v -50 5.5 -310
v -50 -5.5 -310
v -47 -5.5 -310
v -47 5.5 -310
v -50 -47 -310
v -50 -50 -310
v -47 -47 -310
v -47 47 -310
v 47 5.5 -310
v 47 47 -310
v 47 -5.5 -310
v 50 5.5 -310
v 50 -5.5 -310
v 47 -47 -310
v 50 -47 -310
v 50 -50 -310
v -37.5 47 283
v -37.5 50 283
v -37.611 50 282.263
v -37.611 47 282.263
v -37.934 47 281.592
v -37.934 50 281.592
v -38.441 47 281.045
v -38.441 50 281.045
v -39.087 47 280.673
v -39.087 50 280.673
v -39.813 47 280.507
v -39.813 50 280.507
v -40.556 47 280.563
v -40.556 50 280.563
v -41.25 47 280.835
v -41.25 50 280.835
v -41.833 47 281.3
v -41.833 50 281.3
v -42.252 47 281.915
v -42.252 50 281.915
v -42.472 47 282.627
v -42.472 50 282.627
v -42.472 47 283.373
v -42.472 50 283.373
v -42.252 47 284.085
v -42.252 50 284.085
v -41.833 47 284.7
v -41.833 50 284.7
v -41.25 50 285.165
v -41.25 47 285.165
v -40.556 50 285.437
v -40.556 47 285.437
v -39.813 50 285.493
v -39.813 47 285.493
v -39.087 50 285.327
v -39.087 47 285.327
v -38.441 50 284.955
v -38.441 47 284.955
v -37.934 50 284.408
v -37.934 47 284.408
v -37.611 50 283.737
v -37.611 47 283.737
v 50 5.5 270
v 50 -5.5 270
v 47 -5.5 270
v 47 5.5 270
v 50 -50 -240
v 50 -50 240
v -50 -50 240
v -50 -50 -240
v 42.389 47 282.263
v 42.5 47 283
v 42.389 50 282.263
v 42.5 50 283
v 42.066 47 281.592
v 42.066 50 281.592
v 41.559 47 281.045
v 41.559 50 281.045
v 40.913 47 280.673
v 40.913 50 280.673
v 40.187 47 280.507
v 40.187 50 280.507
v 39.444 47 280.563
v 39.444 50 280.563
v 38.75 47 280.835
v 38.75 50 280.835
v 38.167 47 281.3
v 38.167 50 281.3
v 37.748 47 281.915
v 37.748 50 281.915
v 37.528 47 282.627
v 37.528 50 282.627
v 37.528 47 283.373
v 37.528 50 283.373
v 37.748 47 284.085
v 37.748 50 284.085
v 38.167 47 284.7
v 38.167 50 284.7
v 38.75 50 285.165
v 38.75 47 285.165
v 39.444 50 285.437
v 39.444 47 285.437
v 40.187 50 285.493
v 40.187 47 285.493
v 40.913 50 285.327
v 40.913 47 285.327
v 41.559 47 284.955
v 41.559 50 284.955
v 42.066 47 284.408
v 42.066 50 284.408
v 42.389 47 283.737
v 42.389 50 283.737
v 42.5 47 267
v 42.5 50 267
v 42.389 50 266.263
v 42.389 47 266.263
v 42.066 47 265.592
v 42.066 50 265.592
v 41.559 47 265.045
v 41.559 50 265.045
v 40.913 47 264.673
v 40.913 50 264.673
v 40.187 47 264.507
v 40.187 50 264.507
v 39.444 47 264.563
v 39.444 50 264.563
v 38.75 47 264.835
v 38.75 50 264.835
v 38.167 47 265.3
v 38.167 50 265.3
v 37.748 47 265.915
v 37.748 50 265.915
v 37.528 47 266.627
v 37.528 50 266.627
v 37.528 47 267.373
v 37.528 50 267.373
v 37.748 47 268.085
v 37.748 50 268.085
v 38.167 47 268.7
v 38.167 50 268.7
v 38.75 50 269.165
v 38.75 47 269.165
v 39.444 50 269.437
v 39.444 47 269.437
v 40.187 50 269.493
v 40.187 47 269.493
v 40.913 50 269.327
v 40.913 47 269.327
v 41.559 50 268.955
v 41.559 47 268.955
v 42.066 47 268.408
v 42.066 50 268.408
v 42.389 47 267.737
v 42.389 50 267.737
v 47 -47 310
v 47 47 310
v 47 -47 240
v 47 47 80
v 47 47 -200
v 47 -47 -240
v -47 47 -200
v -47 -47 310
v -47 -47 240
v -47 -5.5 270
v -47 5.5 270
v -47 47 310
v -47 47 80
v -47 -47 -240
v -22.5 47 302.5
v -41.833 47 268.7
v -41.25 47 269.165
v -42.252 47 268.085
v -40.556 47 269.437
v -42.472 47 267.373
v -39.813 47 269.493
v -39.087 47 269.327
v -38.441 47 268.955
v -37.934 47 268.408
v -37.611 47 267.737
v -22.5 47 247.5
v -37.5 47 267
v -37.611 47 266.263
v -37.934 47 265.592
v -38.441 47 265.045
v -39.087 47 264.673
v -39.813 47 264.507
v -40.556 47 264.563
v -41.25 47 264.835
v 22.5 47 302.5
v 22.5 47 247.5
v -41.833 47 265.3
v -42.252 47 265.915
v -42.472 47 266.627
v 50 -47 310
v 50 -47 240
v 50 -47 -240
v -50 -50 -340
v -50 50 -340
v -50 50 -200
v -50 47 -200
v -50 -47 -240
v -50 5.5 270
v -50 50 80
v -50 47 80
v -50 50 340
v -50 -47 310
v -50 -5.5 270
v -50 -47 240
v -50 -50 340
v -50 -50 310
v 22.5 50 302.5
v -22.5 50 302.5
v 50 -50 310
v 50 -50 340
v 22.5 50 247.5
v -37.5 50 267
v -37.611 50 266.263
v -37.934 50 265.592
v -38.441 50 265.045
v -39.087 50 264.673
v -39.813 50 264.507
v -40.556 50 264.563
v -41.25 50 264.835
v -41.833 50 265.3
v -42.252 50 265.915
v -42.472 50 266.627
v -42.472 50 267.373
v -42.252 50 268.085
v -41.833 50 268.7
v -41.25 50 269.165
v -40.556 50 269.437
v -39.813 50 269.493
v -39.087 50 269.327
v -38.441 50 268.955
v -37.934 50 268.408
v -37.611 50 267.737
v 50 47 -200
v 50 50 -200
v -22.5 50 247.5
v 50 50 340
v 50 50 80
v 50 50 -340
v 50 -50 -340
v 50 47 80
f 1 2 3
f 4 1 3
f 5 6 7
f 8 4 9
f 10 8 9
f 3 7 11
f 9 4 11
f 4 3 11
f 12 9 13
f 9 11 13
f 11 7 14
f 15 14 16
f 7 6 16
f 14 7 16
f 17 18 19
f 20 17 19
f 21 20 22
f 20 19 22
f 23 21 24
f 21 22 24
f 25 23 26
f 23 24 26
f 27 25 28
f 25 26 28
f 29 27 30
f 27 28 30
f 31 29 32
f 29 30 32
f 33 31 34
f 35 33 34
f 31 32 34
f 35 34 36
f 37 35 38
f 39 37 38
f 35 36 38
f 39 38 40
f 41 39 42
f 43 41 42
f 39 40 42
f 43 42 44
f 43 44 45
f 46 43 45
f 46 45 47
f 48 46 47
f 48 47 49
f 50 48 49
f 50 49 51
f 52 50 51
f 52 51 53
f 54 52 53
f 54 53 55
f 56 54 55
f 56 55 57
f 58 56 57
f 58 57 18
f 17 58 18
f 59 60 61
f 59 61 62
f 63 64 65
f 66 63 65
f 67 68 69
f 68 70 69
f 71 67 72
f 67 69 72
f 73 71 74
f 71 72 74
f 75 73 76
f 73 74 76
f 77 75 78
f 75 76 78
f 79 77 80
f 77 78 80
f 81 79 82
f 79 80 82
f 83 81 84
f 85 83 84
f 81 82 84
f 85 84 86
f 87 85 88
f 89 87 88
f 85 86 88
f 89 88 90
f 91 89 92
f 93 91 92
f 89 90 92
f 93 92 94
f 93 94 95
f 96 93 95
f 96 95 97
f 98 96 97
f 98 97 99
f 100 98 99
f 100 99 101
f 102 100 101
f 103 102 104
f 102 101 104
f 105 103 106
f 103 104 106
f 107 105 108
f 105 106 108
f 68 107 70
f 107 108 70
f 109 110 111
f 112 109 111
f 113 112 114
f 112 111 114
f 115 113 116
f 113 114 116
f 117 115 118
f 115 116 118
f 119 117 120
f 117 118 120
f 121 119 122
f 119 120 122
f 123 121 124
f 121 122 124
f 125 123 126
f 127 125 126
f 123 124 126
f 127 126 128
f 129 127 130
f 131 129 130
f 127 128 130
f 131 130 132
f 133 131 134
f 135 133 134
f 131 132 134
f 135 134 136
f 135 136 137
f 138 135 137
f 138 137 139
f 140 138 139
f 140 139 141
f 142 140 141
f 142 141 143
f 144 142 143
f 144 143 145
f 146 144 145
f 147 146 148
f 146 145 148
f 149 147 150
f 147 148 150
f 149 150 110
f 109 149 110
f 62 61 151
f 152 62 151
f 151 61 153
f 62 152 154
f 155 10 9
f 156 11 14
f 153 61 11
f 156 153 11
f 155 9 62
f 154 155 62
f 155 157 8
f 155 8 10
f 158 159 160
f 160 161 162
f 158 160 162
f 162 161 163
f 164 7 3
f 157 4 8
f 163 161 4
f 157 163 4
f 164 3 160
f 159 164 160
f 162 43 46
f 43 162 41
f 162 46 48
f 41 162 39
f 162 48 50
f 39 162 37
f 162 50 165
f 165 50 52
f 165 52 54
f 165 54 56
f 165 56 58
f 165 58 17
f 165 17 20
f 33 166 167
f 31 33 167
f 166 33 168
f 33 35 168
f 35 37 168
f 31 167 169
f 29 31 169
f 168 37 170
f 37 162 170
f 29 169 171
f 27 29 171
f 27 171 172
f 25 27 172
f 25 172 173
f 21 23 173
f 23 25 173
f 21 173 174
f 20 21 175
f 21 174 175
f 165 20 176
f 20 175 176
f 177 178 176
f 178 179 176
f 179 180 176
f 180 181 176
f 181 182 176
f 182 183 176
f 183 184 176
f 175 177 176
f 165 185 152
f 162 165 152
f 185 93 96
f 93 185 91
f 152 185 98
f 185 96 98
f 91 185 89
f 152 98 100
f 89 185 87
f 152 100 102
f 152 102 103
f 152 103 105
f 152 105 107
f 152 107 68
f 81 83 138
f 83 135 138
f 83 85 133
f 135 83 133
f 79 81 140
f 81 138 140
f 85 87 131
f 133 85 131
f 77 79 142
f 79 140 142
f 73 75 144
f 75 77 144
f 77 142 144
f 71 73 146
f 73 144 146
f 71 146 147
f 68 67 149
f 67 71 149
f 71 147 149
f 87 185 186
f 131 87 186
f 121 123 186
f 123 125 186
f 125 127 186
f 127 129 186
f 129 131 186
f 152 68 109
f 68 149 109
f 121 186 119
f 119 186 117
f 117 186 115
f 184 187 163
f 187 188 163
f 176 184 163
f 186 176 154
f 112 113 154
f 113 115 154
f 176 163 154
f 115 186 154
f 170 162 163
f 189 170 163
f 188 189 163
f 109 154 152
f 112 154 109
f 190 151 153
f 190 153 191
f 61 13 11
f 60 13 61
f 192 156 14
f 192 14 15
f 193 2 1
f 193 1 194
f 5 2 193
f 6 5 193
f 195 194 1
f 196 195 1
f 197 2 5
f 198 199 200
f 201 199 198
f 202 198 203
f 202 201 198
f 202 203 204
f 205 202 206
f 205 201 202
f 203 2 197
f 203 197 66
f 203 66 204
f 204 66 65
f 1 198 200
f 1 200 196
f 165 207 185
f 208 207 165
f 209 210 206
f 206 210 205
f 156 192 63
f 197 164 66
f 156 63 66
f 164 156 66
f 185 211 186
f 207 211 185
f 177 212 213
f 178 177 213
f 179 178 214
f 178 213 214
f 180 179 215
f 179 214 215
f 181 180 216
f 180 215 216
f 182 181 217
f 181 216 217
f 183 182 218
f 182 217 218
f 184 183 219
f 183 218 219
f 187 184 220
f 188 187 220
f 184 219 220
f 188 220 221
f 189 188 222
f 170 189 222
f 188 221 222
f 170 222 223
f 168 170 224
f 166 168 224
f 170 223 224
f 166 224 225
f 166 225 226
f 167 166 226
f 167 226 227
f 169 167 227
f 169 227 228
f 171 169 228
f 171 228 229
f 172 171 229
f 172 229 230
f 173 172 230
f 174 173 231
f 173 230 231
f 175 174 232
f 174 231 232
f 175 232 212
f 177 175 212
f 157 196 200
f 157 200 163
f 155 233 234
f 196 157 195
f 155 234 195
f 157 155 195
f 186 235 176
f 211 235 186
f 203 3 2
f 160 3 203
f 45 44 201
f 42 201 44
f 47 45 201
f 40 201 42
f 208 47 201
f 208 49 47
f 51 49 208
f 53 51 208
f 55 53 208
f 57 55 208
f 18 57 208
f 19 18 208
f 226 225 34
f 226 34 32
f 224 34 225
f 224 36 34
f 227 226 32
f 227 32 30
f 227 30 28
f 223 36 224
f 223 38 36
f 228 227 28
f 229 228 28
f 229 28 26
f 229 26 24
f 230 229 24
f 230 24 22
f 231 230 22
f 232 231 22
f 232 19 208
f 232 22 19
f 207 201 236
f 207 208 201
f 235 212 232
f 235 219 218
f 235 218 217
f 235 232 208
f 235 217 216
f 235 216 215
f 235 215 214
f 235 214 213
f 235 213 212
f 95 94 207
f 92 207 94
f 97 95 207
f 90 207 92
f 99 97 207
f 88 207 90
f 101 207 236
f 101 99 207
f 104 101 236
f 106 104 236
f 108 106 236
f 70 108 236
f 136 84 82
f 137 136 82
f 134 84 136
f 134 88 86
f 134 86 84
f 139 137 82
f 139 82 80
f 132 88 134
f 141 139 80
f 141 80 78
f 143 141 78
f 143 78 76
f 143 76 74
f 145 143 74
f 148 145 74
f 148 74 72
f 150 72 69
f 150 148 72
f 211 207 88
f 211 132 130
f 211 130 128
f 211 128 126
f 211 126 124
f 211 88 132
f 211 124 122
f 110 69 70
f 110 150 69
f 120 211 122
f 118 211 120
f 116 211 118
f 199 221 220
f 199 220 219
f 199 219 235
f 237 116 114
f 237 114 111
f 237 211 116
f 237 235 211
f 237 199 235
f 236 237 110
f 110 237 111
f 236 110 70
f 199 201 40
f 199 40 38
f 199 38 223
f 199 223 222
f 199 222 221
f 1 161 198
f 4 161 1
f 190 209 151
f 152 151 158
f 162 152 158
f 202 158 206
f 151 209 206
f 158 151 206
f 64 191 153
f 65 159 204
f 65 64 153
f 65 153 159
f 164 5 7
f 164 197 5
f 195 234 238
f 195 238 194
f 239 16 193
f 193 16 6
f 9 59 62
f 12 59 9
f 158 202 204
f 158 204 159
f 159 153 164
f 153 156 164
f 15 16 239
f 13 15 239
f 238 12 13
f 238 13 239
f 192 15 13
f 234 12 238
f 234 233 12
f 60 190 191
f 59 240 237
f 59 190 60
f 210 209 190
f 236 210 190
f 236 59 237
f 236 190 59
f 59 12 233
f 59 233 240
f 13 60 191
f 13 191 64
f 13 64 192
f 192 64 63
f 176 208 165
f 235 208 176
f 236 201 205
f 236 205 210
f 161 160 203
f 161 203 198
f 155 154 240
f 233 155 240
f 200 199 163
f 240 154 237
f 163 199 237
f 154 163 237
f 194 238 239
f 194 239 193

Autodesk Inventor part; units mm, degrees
ref_plane "YZ Plane" through (0, 0, 0) normal (1, 0, 0) x (0, 1, 0)
ref_plane "XZ Plane" through (0, 0, 0) normal (0, 1, 0) x (-1, 0, 0)
ref_plane "XY Plane" through (0, 0, 0) normal (0, 0, 1) x (1, 0, 0)
sketch "Sketch1" plane through (0, 0, 0) normal (0, 0, 1) x (1, 0, 0)
  line L0 (-50, 50) -> (50, 50)
  line L1 (50, 50) -> (50, -50)
  line L2 (50, -50) -> (-50, -50)
  line L3 (-50, -50) -> (-50, 50)
  line L4 (-50, 50) -> (50, -50) construction
  line L5 (50, 50) -> (-50, -50) construction
  line L6 (-47, 47) -> (47, 47)
  line L7 (47, 47) -> (47, -47)
  line L8 (47, -47) -> (-47, -47)
  line L9 (-47, -47) -> (-47, 47)
  line L10 (-47, 47) -> (47, -47) construction
  line L11 (47, 47) -> (-47, -47) construction
  point P0 (0, 0)
  dimension "d0" = 100
  dimension "d1" = 100
  dimension "d2" = 94
  dimension "d3" = 94
extrude "Extrusion1" add sketch "Sketch1" along normal mid plane 620
sketch "Sketch3" plane through (50, -50, 310) normal (1, 0, 0) x (0, 0, -1)
  line L0 (310, 50) -> (40, 50)
  line L1 (310, 50) -> (620, 50)
  line L2 (620, 50) -> (330, 50)
  line L3 (40, 50) -> (330, 50)
  line L4 (40, 55.5) -> (620, 55.5)
  line L5 (620, 55.5) -> (620, 44.5)
  line L6 (620, 44.5) -> (40, 44.5)
  line L7 (40, 44.5) -> (40, 55.5)
  line L8 (40, 55.5) -> (620, 44.5) construction
  line L9 (620, 55.5) -> (40, 44.5) construction
  dimension "d6" = 270
  dimension "d7" = 310
  dimension "d23" = 290
  dimension "d24" = 580
  dimension "d25" = 11
extrude "Extrusion2" cut sketch "Sketch3" against normal blind 620
sketch "Sketch4" plane through (-50, 50, 310) normal (0, 1, 0) x (1, 0, 0)
  line L0 (50, 310) -> (50, 230)
  line L1 (50, 310) -> (50, 510)
  line L2 (50, 510) -> (50, 370)
  line L3 (0, 230) -> (100, 230)
  line L4 (100, 230) -> (100, 510)
  line L5 (100, 510) -> (0, 510)
  line L6 (0, 510) -> (0, 230)
  line L7 (0, 230) -> (100, 510) construction
  line L8 (100, 230) -> (0, 510) construction
  dimension "d12" = 80
  dimension "d13" = 200
  dimension "d14" = 140
extrude "Extrusion3" cut sketch "Sketch4" against normal blind 3
sketch "Sketch7" plane through (0, 0, 310) normal (0, 0, 1) x (1, 0, 0)
  line L0 (-50, -50) -> (50, -50) projected
  line L1 (-50, 50) -> (50, 50)
  line L2 (50, 50) -> (50, -50)
  line L3 (50, -50) -> (-50, -50)
  line L4 (-50, -50) -> (-50, 50)
  line L5 (-50, 50) -> (50, -50) construction
  line L6 (50, 50) -> (-50, -50) construction
  point P0 (0, 0)
extrude "Extrusion4" add sketch "Sketch7" along normal blind 30
mirror "Mirror1" about plane through (0, 0, 0) normal (0, 0, 1) of "Extrusion4"
sketch "Sketch9" plane through (-50, -50, 340) normal (0, -1, 0) x (1, 0, 0)
  line L0 (100, -30) -> (0, -30)
  line L1 (0, -30) -> (0, -650)
  line L2 (0, -650) -> (100, -650)
  line L3 (100, -650) -> (100, -30)
  line L4 (100, -30) -> (0, -650) construction
  line L5 (0, -30) -> (100, -650) construction
  line L6 (0, -30) -> (100, -30)
  line L7 (100, -30) -> (100, -100)
  line L8 (100, -100) -> (0, -100)
  line L9 (0, -100) -> (0, -30)
  line L10 (0, -650) -> (100, -650)
  line L11 (100, -650) -> (100, -580)
  line L12 (100, -580) -> (0, -580)
  line L13 (0, -580) -> (0, -650)
  point P0 (50, -340)
  dimension "d26" = 100
  dimension "d27" = 620
  dimension "d28" = 100
  dimension "d29" = 70
  dimension "d30" = 100
  dimension "d31" = 70
extrude "Extrusion6" cut sketch "Sketch9" against normal blind 3 contours L3 L8 L1 L0 | L3 L2 L1 L12
sketch "Sketch10" plane through (-50, 50, 80) normal (0, 1, 0) x (1, 0, 0)
  line L0 (100, -160) -> (0, -160) projected
  line L1 (0, -230) -> (100, -230) projected
  line L2 (0, -230) -> (100, -160)
  line L3 (10, -203) -> (90, -203)
  line L4 (90, -203) -> (90, -187)
  line L5 (90, -187) -> (10, -187)
  line L6 (10, -187) -> (10, -203)
  line L7 (10, -203) -> (90, -187) construction
  line L8 (90, -203) -> (10, -187) construction
  circle A0 centre (10, -187) radius 2.5
  circle A1 centre (10, -203) radius 2.5
  circle A2 centre (90, -203) radius 2.5
  circle A3 centre (90, -187) radius 2.5
  line L9 (72.5, -222.5) -> (27.5, -222.5)
  line L10 (27.5, -222.5) -> (27.5, -167.5)
  line L11 (27.5, -167.5) -> (72.5, -167.5)
  line L12 (72.5, -167.5) -> (72.5, -222.5)
  line L13 (72.5, -222.5) -> (27.5, -167.5) construction
  line L14 (27.5, -222.5) -> (72.5, -167.5) construction
  point P0 (50, 80)
  point P1 (50, -195)
  dimension "d34" = 80
  dimension "d35" = 16
  dimension "d36" = 5
  dimension "d37" = 5
  dimension "d38" = 5
  dimension "d39" = 5
  dimension "d42" = 45
  dimension "d43" = 55
extrude "Extrusion7" cut sketch "Sketch10" against normal blind 3 contours L10 L3 L2 | L2 L3 L12 L9 L10 | L3 L10 L5 L2 | L2 L5 L12 L3 | L5 L10 L11 L12 L2 | L2 L12 L5 | A1 L6 L3 | L3 L6 A1 | A2 L4 L3 | L3 L4 A2 | A0 L6 L5 | L5 L6 A0 | A3 L4 L5 | L5 L4 A3
properties part number "GUIA_CUADRADA"
